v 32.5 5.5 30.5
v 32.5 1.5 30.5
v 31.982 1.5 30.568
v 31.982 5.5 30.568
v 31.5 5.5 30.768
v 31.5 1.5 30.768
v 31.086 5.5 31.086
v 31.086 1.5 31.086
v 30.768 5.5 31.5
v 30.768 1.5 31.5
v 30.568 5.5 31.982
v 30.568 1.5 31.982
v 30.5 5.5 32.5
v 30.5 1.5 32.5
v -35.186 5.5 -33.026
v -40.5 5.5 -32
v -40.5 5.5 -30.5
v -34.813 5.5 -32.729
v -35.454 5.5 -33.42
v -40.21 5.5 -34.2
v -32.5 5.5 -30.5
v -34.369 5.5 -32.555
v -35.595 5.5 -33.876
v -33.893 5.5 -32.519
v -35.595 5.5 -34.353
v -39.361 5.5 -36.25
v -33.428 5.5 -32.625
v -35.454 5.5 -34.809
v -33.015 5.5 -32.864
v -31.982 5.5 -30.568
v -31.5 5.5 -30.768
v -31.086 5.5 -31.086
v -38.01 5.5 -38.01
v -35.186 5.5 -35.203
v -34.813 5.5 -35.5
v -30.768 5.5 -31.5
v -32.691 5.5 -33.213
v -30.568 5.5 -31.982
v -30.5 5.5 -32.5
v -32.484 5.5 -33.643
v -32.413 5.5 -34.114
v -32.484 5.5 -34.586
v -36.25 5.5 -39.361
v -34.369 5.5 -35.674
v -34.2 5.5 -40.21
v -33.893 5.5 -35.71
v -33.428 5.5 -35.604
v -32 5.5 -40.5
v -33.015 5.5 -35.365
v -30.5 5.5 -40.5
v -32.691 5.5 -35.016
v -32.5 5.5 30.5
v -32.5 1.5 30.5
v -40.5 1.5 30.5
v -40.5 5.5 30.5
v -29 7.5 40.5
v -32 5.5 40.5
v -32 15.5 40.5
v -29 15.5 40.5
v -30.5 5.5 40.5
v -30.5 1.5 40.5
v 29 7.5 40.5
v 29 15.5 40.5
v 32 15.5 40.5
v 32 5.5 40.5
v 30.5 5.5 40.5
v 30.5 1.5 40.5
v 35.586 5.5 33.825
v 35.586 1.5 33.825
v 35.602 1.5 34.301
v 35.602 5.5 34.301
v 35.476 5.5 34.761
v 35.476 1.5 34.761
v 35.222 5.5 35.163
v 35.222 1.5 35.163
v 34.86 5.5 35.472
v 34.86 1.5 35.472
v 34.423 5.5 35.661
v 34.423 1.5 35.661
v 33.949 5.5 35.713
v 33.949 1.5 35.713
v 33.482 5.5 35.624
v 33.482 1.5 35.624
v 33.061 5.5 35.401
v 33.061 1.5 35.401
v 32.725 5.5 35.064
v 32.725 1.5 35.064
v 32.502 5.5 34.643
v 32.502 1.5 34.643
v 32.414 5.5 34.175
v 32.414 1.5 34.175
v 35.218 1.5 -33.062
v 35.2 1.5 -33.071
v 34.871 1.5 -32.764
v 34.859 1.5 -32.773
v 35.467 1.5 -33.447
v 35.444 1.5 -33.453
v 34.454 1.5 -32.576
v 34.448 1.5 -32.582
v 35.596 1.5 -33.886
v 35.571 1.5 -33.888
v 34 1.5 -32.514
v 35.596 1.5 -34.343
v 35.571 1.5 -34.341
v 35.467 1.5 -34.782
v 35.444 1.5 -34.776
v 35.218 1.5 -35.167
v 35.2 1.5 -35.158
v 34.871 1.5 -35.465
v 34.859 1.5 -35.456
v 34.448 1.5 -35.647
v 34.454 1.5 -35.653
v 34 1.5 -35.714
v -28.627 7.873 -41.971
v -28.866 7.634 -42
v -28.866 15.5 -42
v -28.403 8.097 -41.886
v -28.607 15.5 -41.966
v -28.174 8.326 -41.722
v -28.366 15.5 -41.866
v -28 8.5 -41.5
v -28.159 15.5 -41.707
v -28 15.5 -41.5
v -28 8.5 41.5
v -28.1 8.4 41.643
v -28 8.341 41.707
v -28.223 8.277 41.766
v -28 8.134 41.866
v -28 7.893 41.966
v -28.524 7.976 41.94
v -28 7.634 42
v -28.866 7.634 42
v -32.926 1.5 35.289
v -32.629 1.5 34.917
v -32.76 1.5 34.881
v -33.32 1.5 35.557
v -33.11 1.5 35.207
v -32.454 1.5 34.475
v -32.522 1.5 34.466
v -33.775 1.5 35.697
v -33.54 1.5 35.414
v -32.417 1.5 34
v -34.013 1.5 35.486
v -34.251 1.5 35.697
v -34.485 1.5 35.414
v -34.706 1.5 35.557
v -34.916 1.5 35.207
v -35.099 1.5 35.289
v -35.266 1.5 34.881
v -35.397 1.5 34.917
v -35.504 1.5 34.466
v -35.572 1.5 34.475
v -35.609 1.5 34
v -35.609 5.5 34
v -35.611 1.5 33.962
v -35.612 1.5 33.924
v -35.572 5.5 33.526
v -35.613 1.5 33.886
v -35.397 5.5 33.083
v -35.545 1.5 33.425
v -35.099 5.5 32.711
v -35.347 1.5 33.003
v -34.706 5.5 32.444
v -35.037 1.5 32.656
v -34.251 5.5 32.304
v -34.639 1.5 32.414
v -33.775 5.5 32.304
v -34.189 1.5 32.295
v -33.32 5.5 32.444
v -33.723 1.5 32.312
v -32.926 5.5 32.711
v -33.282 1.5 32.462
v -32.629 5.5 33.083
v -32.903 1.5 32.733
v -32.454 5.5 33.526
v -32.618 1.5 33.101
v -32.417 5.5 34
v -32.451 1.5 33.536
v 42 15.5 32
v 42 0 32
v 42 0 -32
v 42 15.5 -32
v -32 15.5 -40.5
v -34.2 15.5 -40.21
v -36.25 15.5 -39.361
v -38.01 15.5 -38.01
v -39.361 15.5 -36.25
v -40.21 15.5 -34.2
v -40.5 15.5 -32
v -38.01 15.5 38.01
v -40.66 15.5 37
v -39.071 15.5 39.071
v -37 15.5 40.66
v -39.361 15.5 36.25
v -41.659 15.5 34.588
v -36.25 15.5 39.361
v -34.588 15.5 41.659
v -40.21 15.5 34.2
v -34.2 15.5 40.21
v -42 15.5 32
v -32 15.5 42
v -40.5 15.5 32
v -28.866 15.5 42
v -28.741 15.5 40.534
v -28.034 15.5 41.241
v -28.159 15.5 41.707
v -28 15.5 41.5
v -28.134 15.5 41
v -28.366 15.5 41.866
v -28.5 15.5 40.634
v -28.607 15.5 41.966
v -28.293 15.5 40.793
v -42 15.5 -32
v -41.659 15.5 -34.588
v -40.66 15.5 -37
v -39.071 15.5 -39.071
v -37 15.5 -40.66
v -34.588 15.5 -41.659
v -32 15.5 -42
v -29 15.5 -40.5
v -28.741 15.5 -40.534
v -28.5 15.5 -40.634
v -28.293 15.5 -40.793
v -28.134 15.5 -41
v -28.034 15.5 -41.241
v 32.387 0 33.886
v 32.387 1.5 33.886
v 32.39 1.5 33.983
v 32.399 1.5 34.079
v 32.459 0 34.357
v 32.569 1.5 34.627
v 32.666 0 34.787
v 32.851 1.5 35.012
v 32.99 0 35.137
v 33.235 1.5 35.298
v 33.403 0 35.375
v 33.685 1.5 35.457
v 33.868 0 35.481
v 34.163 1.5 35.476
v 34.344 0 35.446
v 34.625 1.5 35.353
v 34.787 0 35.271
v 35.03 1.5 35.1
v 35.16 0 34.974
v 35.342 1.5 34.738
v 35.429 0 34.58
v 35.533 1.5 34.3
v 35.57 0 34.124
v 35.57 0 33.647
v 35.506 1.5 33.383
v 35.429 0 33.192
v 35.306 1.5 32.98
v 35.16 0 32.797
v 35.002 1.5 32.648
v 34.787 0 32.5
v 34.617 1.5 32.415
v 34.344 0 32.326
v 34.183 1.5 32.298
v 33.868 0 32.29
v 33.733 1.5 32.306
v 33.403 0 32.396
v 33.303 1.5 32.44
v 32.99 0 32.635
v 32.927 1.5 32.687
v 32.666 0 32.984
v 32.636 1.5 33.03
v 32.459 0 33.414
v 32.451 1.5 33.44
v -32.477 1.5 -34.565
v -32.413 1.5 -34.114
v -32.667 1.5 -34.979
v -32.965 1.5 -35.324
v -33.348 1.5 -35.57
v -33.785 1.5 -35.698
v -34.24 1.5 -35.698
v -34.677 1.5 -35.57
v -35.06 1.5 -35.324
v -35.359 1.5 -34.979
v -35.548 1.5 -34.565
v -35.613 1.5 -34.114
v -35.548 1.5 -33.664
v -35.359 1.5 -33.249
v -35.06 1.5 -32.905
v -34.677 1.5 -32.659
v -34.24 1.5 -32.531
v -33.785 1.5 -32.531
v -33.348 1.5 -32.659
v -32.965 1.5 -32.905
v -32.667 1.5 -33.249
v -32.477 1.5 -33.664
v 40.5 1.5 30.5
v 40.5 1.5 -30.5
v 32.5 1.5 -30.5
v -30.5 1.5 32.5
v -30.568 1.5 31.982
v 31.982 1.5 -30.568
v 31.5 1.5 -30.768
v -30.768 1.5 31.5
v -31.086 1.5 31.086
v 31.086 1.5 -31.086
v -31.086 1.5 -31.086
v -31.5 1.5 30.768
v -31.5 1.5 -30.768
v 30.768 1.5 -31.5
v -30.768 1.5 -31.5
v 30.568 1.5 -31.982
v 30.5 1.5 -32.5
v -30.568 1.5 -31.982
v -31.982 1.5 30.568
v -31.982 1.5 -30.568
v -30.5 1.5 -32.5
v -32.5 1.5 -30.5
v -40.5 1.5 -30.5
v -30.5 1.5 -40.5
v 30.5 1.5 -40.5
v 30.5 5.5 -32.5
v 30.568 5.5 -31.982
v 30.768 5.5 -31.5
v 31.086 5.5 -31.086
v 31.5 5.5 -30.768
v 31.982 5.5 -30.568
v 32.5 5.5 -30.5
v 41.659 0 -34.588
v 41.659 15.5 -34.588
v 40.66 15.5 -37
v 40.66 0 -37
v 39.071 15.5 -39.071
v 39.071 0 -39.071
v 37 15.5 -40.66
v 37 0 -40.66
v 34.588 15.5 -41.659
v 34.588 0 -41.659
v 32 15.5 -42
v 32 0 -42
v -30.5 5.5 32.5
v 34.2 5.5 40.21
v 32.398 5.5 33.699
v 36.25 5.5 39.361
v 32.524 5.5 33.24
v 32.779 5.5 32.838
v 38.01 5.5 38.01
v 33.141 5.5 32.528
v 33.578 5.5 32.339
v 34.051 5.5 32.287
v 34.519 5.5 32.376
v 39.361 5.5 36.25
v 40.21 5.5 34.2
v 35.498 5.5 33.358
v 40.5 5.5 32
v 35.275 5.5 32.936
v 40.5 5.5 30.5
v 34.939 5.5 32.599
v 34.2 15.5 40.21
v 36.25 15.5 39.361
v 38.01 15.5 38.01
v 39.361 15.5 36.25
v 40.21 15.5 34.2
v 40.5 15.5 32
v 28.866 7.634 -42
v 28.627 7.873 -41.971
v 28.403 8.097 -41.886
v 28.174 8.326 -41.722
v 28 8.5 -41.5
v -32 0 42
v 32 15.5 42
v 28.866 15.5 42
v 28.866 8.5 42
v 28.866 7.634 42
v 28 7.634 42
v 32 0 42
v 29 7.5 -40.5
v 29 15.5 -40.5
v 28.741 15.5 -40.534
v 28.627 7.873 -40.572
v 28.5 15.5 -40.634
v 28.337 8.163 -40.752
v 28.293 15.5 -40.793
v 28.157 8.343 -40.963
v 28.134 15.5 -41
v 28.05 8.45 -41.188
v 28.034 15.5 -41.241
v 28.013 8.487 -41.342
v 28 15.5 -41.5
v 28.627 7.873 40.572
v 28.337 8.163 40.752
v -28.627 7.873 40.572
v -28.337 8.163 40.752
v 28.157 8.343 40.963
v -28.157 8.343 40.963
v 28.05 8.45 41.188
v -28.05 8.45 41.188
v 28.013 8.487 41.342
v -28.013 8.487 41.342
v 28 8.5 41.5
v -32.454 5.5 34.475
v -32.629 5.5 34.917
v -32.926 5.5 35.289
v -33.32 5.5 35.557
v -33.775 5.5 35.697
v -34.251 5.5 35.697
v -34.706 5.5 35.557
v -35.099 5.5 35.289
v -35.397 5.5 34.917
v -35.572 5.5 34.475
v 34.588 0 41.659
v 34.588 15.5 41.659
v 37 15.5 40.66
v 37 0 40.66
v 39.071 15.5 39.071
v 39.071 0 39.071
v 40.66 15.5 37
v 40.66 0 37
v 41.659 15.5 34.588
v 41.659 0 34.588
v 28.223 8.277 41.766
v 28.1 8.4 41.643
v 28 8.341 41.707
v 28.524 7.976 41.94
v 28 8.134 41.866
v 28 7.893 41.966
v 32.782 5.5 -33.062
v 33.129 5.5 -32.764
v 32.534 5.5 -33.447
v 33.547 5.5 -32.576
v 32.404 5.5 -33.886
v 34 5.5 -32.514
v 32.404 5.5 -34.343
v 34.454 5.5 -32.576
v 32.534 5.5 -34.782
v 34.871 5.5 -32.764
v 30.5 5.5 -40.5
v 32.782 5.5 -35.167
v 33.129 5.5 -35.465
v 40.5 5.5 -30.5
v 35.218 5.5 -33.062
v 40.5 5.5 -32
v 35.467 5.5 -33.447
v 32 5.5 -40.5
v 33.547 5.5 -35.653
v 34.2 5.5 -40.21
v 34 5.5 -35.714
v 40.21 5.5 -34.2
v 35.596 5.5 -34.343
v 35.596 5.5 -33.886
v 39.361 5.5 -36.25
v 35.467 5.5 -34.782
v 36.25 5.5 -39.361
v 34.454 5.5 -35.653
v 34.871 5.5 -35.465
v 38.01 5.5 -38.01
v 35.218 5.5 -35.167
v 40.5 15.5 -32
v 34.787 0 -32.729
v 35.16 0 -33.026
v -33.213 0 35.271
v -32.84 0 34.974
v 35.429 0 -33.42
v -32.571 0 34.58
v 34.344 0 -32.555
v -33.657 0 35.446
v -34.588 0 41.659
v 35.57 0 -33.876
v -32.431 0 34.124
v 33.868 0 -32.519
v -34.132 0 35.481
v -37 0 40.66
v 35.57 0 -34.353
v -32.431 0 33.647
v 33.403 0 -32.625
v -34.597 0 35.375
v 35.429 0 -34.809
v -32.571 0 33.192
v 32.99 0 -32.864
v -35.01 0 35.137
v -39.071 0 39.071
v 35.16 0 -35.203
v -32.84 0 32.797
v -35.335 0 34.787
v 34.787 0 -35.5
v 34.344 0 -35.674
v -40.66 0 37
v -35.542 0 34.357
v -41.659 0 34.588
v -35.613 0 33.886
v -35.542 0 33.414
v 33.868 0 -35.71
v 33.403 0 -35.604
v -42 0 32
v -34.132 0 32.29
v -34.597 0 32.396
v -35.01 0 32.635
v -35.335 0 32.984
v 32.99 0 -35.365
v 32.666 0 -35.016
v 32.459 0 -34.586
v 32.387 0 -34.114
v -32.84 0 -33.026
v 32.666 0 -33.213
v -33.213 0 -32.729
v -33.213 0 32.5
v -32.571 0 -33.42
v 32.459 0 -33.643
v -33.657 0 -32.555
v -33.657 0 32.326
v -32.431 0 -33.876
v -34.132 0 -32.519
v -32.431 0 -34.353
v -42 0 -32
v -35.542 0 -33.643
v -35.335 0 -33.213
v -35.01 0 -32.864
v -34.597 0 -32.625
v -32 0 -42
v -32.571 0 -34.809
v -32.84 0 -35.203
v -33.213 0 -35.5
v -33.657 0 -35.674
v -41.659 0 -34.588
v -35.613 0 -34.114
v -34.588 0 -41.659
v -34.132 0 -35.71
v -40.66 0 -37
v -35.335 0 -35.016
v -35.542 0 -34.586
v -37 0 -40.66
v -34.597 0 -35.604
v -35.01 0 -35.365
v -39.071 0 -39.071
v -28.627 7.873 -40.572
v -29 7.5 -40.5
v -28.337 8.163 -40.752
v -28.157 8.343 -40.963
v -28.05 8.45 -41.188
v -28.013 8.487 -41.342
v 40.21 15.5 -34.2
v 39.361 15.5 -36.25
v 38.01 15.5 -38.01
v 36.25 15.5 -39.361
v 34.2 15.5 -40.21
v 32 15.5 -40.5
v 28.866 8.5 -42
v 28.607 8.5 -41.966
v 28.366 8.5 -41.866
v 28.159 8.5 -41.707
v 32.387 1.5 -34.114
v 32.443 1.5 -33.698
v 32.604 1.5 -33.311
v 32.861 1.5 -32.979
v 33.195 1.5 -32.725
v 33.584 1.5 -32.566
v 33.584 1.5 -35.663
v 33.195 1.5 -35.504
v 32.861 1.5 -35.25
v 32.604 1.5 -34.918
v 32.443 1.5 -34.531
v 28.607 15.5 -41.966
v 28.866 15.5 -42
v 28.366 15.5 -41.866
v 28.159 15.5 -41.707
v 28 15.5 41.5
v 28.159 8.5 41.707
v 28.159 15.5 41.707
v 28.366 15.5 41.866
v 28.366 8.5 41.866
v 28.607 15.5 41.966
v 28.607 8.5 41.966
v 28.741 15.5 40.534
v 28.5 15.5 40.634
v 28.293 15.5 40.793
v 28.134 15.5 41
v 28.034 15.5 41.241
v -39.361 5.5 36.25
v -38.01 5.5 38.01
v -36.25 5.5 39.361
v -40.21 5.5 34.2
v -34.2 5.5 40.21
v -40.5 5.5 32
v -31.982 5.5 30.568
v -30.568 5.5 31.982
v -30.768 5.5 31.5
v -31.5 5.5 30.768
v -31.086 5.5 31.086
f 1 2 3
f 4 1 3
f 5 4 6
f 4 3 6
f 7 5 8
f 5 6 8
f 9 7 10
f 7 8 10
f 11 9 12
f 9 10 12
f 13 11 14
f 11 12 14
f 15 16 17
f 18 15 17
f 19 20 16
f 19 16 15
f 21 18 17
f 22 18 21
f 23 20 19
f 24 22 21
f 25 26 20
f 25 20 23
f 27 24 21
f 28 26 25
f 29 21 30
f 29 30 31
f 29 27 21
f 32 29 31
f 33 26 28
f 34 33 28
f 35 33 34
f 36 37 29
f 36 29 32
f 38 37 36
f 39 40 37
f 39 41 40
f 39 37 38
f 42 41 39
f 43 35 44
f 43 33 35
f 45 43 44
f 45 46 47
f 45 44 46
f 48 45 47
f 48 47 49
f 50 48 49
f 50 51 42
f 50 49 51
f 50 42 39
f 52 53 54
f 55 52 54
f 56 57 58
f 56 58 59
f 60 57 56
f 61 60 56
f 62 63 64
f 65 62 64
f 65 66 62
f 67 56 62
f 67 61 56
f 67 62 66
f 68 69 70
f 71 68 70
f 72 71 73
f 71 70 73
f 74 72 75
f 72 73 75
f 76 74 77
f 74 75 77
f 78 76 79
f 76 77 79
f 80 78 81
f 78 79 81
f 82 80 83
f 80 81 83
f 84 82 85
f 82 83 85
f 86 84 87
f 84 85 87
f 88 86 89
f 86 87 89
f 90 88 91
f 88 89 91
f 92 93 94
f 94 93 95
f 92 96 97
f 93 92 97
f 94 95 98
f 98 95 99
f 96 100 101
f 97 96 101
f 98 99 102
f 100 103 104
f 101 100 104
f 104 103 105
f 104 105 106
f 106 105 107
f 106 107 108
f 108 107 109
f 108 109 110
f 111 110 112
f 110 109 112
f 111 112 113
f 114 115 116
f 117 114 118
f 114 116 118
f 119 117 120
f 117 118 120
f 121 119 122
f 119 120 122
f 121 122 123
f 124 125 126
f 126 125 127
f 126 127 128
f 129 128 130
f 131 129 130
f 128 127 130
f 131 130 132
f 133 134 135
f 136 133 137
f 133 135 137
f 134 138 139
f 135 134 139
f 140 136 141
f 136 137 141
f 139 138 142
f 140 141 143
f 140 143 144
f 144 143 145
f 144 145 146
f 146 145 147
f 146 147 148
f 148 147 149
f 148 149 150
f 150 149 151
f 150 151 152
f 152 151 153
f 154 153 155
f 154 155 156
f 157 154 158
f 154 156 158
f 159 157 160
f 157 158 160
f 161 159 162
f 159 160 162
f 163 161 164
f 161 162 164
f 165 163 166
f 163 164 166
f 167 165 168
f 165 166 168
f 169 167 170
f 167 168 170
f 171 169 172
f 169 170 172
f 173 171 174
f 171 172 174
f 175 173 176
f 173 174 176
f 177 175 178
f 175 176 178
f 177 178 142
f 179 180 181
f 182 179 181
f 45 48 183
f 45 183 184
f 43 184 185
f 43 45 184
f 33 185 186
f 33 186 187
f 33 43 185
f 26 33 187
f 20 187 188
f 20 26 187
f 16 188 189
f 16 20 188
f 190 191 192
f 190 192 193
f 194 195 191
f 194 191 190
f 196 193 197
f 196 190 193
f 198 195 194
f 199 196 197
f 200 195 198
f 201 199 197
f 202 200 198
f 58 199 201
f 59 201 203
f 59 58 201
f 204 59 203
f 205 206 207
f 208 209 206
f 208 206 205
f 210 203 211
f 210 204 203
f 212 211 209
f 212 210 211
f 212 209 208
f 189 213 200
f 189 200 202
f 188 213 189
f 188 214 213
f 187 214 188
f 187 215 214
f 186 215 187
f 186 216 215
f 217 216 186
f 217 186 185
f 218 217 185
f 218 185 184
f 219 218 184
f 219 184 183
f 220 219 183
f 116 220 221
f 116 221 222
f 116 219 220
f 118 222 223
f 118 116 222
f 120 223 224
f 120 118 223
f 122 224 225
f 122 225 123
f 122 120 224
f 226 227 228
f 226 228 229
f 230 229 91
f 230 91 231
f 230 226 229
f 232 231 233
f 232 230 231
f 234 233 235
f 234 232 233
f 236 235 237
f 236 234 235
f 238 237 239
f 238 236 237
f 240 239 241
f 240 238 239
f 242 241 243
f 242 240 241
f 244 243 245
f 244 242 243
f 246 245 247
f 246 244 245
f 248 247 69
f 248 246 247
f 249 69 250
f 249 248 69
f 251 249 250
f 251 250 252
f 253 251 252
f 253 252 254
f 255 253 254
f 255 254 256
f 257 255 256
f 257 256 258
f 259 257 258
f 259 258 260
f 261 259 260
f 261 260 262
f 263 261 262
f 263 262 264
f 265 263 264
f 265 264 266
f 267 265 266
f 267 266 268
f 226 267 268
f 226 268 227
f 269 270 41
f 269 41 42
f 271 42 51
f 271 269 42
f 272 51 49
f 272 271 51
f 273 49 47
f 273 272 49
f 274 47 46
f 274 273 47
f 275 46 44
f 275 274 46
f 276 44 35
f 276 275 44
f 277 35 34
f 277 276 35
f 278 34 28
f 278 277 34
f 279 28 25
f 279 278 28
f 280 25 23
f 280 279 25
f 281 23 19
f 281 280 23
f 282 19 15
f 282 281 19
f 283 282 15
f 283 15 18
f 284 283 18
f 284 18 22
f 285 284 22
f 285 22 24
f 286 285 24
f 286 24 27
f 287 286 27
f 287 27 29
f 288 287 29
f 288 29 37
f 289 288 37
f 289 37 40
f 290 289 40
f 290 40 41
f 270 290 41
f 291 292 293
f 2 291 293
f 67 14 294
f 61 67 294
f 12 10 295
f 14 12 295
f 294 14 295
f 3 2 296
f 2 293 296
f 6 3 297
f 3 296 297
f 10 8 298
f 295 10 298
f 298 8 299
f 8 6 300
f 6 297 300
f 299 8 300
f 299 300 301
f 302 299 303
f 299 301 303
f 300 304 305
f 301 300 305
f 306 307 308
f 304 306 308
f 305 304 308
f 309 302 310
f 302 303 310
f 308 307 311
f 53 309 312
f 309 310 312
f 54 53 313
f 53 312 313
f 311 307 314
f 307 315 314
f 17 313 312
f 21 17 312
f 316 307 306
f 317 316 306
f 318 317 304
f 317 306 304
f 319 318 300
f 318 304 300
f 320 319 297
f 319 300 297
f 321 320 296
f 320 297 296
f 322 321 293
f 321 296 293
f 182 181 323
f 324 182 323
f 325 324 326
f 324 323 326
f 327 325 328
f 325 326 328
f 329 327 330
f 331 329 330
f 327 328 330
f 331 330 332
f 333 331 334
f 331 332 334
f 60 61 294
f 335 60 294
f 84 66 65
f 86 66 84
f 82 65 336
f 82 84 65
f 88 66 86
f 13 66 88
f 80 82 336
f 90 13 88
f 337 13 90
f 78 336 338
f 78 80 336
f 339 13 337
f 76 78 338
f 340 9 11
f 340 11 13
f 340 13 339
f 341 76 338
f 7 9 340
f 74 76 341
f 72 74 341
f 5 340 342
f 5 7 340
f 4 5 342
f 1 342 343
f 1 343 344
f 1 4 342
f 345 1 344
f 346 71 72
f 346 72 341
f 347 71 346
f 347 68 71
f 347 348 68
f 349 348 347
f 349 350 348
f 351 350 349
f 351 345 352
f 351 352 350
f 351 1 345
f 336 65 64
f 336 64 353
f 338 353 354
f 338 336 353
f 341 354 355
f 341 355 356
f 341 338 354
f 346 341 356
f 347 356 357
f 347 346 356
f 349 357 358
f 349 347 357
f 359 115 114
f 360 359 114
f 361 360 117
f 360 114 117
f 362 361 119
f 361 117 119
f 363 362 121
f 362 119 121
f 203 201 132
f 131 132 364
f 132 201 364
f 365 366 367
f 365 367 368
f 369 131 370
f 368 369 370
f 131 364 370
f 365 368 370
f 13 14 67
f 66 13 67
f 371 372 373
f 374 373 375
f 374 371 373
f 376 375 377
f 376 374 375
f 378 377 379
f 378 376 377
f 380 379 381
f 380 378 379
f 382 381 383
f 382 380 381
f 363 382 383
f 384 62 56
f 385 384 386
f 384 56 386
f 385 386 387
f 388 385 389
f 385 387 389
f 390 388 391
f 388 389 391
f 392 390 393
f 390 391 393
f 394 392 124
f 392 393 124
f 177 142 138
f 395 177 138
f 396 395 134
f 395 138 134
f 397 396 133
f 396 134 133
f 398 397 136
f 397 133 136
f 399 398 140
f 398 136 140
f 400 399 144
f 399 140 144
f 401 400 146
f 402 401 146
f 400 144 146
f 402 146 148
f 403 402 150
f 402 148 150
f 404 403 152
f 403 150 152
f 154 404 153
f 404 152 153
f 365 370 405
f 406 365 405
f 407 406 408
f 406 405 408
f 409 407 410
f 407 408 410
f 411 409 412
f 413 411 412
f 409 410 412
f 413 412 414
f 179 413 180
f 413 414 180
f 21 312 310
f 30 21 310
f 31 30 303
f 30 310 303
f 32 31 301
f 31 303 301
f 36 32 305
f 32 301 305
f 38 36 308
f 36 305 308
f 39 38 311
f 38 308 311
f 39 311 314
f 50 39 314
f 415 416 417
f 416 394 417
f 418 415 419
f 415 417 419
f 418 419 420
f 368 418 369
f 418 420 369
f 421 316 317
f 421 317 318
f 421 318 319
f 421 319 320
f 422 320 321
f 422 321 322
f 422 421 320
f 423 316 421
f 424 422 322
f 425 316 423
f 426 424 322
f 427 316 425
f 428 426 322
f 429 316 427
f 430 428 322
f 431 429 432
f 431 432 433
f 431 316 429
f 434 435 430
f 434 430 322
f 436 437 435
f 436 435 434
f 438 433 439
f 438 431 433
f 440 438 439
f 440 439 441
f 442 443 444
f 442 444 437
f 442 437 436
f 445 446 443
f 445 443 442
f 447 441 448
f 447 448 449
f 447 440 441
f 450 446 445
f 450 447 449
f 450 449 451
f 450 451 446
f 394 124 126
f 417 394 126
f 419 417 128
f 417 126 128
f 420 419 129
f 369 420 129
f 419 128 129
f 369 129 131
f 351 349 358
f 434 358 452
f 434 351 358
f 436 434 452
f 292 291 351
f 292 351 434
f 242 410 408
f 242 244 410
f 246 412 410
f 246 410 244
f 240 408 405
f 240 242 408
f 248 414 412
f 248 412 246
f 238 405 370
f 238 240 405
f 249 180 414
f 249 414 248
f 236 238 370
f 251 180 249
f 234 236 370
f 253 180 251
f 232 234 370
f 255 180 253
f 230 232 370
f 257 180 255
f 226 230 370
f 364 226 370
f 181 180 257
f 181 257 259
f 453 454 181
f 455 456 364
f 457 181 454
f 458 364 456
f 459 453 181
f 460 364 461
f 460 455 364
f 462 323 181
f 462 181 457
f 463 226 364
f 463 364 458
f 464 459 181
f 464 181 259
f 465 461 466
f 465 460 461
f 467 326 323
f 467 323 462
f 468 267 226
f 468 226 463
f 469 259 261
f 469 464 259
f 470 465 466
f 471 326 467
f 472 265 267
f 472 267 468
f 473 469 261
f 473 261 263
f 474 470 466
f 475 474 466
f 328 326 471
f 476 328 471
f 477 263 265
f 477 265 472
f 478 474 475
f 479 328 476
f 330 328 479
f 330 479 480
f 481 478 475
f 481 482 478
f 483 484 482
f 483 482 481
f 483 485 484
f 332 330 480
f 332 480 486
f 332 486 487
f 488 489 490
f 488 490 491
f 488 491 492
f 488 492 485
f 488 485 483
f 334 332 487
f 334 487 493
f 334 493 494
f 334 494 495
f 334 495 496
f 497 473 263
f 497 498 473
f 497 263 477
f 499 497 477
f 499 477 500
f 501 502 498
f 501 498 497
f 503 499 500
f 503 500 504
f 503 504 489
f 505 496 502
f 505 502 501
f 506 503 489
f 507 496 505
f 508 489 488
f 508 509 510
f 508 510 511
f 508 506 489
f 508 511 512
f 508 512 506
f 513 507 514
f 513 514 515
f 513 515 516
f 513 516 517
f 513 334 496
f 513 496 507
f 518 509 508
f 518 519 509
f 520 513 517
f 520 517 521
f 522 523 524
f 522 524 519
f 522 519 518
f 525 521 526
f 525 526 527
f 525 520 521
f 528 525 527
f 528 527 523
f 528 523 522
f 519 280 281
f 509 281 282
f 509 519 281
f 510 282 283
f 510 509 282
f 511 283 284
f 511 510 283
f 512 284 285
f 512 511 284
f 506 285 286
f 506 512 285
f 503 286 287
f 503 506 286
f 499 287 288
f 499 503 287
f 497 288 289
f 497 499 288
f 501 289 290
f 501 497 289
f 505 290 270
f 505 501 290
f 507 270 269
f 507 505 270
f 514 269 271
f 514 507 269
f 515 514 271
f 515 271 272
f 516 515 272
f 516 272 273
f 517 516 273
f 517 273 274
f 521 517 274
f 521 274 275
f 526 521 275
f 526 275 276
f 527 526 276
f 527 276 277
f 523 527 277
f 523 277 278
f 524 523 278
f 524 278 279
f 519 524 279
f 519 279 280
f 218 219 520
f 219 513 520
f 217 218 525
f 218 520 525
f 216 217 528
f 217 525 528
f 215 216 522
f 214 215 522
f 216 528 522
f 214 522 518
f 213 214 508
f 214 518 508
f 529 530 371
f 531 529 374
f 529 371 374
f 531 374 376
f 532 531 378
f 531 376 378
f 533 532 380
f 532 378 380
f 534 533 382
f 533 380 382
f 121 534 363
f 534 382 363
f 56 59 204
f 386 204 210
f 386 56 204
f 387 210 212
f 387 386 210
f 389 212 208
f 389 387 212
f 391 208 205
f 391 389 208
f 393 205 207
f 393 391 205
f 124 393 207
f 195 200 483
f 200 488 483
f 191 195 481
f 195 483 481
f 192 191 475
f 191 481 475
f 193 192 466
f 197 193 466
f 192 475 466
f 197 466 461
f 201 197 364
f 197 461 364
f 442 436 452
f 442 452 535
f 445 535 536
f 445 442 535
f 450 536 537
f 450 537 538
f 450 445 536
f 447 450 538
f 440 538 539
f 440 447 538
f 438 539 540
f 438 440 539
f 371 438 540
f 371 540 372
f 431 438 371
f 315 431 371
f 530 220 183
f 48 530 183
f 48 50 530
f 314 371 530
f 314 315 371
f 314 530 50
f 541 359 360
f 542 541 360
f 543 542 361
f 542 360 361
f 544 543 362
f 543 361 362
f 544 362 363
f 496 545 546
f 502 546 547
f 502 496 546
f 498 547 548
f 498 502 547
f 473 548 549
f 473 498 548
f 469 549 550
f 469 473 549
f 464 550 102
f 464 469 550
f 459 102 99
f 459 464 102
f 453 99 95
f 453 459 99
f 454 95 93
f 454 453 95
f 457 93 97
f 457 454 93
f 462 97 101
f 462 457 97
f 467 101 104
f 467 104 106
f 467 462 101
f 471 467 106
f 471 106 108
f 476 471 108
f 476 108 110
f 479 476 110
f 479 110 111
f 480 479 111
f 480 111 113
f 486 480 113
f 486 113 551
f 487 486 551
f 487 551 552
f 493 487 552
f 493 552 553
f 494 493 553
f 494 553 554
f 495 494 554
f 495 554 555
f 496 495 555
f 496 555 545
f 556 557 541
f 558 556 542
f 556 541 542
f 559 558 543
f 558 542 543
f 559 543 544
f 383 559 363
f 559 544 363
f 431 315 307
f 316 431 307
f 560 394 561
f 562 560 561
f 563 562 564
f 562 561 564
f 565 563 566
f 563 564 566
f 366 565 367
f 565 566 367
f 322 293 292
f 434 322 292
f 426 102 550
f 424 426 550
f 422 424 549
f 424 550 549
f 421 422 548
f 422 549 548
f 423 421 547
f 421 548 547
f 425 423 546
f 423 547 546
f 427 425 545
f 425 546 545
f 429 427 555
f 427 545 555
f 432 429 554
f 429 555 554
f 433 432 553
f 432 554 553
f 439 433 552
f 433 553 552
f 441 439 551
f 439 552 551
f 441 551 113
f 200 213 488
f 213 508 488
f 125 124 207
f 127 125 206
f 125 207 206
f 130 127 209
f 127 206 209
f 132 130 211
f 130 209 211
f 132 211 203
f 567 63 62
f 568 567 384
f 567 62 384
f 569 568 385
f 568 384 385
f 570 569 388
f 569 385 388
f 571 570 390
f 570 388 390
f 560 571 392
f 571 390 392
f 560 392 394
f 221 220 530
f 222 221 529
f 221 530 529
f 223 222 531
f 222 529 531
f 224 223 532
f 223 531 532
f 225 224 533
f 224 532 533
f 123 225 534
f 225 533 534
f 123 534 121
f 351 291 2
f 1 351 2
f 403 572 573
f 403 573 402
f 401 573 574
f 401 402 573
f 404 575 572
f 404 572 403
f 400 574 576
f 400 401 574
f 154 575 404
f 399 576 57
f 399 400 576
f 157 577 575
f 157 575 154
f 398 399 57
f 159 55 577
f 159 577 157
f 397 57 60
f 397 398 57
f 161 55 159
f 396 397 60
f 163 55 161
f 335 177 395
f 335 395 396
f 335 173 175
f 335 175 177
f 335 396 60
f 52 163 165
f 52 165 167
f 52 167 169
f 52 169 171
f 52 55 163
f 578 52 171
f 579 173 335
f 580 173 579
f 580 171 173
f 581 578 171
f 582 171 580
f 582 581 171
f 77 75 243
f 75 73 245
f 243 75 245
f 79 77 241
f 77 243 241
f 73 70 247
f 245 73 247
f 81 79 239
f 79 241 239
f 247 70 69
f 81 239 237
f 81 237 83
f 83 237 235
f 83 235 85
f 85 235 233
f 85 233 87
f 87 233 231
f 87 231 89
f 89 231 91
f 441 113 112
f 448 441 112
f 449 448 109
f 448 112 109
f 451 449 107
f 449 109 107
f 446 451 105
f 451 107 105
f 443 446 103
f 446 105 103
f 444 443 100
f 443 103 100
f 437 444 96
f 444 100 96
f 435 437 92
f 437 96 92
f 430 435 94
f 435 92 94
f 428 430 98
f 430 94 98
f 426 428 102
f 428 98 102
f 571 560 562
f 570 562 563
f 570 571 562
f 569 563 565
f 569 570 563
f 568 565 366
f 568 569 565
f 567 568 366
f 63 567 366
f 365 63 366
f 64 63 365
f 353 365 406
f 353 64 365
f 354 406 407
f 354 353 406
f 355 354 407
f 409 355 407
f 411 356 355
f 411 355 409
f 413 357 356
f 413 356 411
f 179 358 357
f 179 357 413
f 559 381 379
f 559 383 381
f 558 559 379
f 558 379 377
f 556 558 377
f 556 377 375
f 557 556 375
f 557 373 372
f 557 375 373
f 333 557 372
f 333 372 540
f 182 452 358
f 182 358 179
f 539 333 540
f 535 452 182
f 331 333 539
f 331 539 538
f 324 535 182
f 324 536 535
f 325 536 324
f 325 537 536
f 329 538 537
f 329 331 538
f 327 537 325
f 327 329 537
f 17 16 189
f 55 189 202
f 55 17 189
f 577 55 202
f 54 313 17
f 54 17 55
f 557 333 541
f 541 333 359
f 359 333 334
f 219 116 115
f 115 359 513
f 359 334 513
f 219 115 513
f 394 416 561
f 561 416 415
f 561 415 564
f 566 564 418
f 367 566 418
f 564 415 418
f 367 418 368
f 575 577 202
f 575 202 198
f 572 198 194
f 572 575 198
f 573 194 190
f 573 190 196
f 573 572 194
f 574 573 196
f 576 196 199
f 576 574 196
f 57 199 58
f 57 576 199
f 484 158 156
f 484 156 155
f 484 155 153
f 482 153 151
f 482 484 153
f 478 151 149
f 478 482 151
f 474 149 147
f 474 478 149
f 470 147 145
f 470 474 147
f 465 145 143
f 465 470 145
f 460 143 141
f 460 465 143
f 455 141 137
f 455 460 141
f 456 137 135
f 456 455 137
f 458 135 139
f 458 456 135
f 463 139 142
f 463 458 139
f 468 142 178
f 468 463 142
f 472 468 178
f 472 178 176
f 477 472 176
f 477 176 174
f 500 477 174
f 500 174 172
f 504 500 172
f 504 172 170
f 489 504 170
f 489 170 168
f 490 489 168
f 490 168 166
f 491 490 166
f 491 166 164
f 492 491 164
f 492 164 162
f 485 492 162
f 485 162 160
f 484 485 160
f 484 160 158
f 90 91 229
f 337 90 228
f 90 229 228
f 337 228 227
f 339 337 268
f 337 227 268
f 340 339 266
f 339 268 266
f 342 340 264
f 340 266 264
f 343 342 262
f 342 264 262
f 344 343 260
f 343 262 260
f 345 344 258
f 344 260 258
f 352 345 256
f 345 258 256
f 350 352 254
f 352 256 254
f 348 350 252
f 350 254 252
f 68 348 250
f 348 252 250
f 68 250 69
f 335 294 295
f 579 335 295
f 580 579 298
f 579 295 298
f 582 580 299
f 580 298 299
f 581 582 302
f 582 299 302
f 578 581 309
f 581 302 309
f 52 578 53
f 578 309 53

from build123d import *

# Parameters (mm, degrees)
EXTRUDE_1_DEPTH     = 1.5
EXTRUDE_2_DEPTH     = 14
EXTRUDE_3_OUTLINE_R = 1.60000381
EXTRUDE_3_DEPTH     = 4
SKETCH_4_W          = 56
SKETCH_4_H          = 7
CUT_EXTRUDE_1_DEPTH = 2
SKETCH_5_W          = 56
SKETCH_5_H          = 7
CUT_EXTRUDE_2_DEPTH = 2
FILLET_1_R          = 1
FILLET_2_R          = 1


with BuildPart() as part:
    # 草图1 → 凸台-拉伸1 (new body)
    with BuildSketch(Plane(origin=(0, 0, 0), x_dir=(1, 0, 0), z_dir=(0, 1, 0))):
        with BuildLine():
            Line((-32, 42), (32, 42))
            ThreePointArc((32, 42), (39.071067812, 39.071067812), (42, 32))
            Line((42, 32), (42, -32))
            ThreePointArc((42, -32), (39.071067812, -39.071067812), (32, -42))
            Line((32, -42), (-32, -42))
            ThreePointArc((-32, -42), (-39.071067812, -39.071067812), (-42, -32))
            Line((-42, -32), (-42, 32))
            ThreePointArc((-42, 32), (-39.071067812, 39.071067812), (-32, 42))
        make_face()
        with BuildLine():
            ThreePointArc((-32.412680975, -33.885727711), (-34.012684785, -32.285723901), (-35.612688595, -33.885727711))
            ThreePointArc((-35.612688595, -33.885727711), (-34.012684785, -35.485731521), (-32.412680975, -33.885727711))
        make_face(mode=Mode.SUBTRACT)
        with BuildLine():
            ThreePointArc((35.587491745, -33.885727711), (33.987487935, -32.285723901), (32.387484125, -33.885727711))
            ThreePointArc((32.387484125, -33.885727711), (33.987487935, -35.485731521), (35.587491745, -33.885727711))
        make_face(mode=Mode.SUBTRACT)
        with BuildLine():
            ThreePointArc((35.587491745, 34.114445009), (33.987487935, 35.714448819), (32.387484125, 34.114445009))
            ThreePointArc((32.387484125, 34.114445009), (33.987487935, 32.514441199), (35.587491745, 34.114445009))
        make_face(mode=Mode.SUBTRACT)
        with BuildLine():
            ThreePointArc((-32.412680975, 34.114445009), (-34.012684785, 35.714448819), (-35.612688595, 34.114445009))
            ThreePointArc((-35.612688595, 34.114445009), (-34.012684785, 32.514441199), (-32.412680975, 34.114445009))
        make_face(mode=Mode.SUBTRACT)
    extrude(amount=EXTRUDE_1_DEPTH)

    # 草图2 → 凸台-拉伸2 (add)
    with BuildSketch(Plane(origin=(0, 1.5, 0), x_dir=(1, 0, 0), z_dir=(0, 1, 0))):
        with BuildLine():
            Line((32, 42), (-32, 42))
            ThreePointArc((-32, 42), (-39.071067812, 39.071067812), (-42, 32))
            Line((-42, 32), (-42, -32))
            ThreePointArc((-42, -32), (-39.071067812, -39.071067812), (-32, -42))
            Line((-32, -42), (32, -42))
            ThreePointArc((32, -42), (39.071067812, -39.071067812), (42, -32))
            Line((42, -32), (42, 32))
            ThreePointArc((42, 32), (39.071067812, 39.071067812), (32, 42))
        make_face()
        with BuildLine():
            Line((-40.5, 32), (-40.5, -32))
            ThreePointArc((-40.5, -32), (-38.01040764, -38.01040764), (-32, -40.5))
            Line((-32, -40.5), (32, -40.5))
            ThreePointArc((32, -40.5), (38.01040764, -38.01040764), (40.5, -32))
            Line((40.5, -32), (40.5, 32))
            ThreePointArc((40.5, 32), (38.01040764, 38.01040764), (32, 40.5))
            Line((32, 40.5), (-32, 40.5))
            ThreePointArc((-32, 40.5), (-38.01040764, 38.01040764), (-40.5, 32))
        make_face(mode=Mode.SUBTRACT)
    extrude(amount=EXTRUDE_2_DEPTH)

    # 凸台-拉伸3: read off the stored shape, not the designer's step
    # 凸台-拉伸3 outline → 凸台-拉伸3 (add)
    # profile 1 of 4: a face of its own
    with BuildSketch(Plane(origin=(0, 1.5, 0), x_dir=(1, 0, 0), z_dir=(0, 1, 0))):
        with BuildLine():
            ThreePointArc((-32.5, 30.5), (-31.085786438, 31.085786438), (-30.5, 32.5))
            Line((-30.5, 32.5), (-30.5, 40.5))
            Line((-30.5, 40.5), (-32, 40.5))
            ThreePointArc((-32, 40.5), (-38.01040764, 38.01040764), (-40.5, 32))
            Line((-40.5, 32), (-40.5, 30.5))
            Line((-40.5, 30.5), (-32.5, 30.5))
        make_face()
        with Locations((-34.012684785, 34.114445009)):
            Circle(EXTRUDE_3_OUTLINE_R, mode=Mode.SUBTRACT)
    # profile 2 of 4: a face of its own
    with BuildSketch(Plane(origin=(0, 1.5, 0), x_dir=(1, 0, 0), z_dir=(0, 1, 0))):
        with BuildLine():
            Line((32, 40.5), (30.5, 40.5))
            Line((30.5, 40.5), (30.5, 32.5))
            ThreePointArc((30.5, 32.5), (31.085786438, 31.085786438), (32.5, 30.5))
            Line((32.5, 30.5), (40.5, 30.5))
            Line((40.5, 30.5), (40.5, 32))
            ThreePointArc((40.5, 32), (38.01040764, 38.01040764), (32, 40.5))
        make_face()
        with BuildLine():
            ThreePointArc((34.00008636, 32.5144908), (32.387484125, 34.114445009), (34.00008636, 35.714399218))
            ThreePointArc((34.00008636, 35.714399218), (35.612688595, 34.114445009), (34.00008636, 32.5144908))
        make_face(mode=Mode.SUBTRACT)
    # profile 3 of 4: a face of its own
    with BuildSketch(Plane(origin=(0, 1.5, 0), x_dir=(1, 0, 0), z_dir=(0, 1, 0))):
        with BuildLine():
            Line((-32.5, -30.5), (-40.5, -30.5))
            Line((-40.5, -30.5), (-40.5, -32))
            ThreePointArc((-40.5, -32), (-38.01040764, -38.01040764), (-32, -40.5))
            Line((-32, -40.5), (-30.5, -40.5))
            Line((-30.5, -40.5), (-30.5, -32.5))
            ThreePointArc((-30.5, -32.5), (-31.085786438, -31.085786438), (-32.5, -30.5))
        make_face()
        with BuildLine():
            ThreePointArc((-35.608596528, -34.00008636), (-34.012684785, -32.285723901), (-32.416773042, -34.00008636))
            ThreePointArc((-32.416773042, -34.00008636), (-34.012684785, -35.714448819), (-35.608596528, -34.00008636))
        make_face(mode=Mode.SUBTRACT)
    # profile 4 of 4: a face of its own
    with BuildSketch(Plane(origin=(0, 1.5, 0), x_dir=(1, 0, 0), z_dir=(0, 1, 0))):
        with BuildLine():
            Line((40.5, -32), (40.5, -30.5))
            Line((40.5, -30.5), (32.5, -30.5))
            ThreePointArc((32.5, -30.5), (31.085786438, -31.085786438), (30.5, -32.5))
            Line((30.5, -32.5), (30.5, -40.5))
            Line((30.5, -40.5), (32, -40.5))
            ThreePointArc((32, -40.5), (38.01040764, -38.01040764), (40.5, -32))
        make_face()
        with BuildLine():
            ThreePointArc((32.413821191, -34.174838714), (33.81228204, -32.295345654), (35.586351529, -33.825334006))
            ThreePointArc((35.586351529, -33.825334006), (34.18789068, -35.704827066), (32.413821191, -34.174838714))
        make_face(mode=Mode.SUBTRACT)
    extrude(amount=EXTRUDE_3_DEPTH)

    # 草图4 → 切除-拉伸1 (cut)
    with BuildSketch(Plane.XY.offset(42)):
        with Locations((0, 12)):
            Rectangle(SKETCH_4_W, SKETCH_4_H)
    extrude(amount=-CUT_EXTRUDE_1_DEPTH, mode=Mode.SUBTRACT)

    # 草图5 → 切除-拉伸2 (cut)
    with BuildSketch(Plane(origin=(0, 0, -42), x_dir=(-1, 0, 0), z_dir=(0, 0, -1))):
        with Locations((0, 12)):
            Rectangle(SKETCH_5_W, SKETCH_5_H)
    extrude(amount=-CUT_EXTRUDE_2_DEPTH, mode=Mode.SUBTRACT)

    # 圆角1
    fillet_1_edges = [part.edges().sort_by_distance(p)[0] for p in [
        (0, 8.5, 40.5),
        (28, 12, 40.5),
        (-28, 12, 40.5),
        (0, 8.5, -40.5),
        (-28, 12, -40.5),
        (28, 12, -40.5),
    ]]
    fillet(fillet_1_edges, radius=FILLET_1_R)

    # 圆角2
    # the kernel refuses this fillet: 1 mm, written as the material it takes off along each edge
    with BuildSketch(Plane(origin=(-28, 17.665063509, 42), x_dir=(-1, 0, 0), z_dir=(0, -1, 0))) as fillet_2_piece_1:
        with BuildLine():
            CenterArc((0.866025404, 1), FILLET_2_R, 210, 60)
            Line((0, 0.5), (-0.017320508, 0.49))
            ThreePointArc((-0.017320508, 0.49), (-0.02, 0.25), (-0.02, 0))
            Line((-0.02, 0), (0, -0.02))
            Line((0, -0.02), (0.866025404, -0.02))
            Line((0.866025404, -0.02), (0.866025404, 0))
        make_face()
    extrude(amount=9.165063509, mode=Mode.SUBTRACT)
    with BuildSketch(Plane(origin=(-28, 8.5, 42), x_dir=(0, -1, 0), z_dir=(1, 0, 0))) as fillet_2_piece_2:
        with BuildLine():
            CenterArc((0.866025404, 1), FILLET_2_R, 210, 60)
            Line((0, 0.5), (-0.017320508, 0.49))
            ThreePointArc((-0.017320508, 0.49), (-0.02, 0.25), (-0.02, 0))
            Line((-0.02, 0), (0, -0.02))
            Line((0, -0.02), (0.866025404, -0.02))
            Line((0.866025404, -0.02), (0.866025404, 0))
        make_face()
    extrude(amount=56, mode=Mode.SUBTRACT)
    with BuildSketch(Plane(origin=(28, 8.5, 42), x_dir=(0, 0, -1), z_dir=(0, 1, 0))) as fillet_2_piece_3:
        with BuildLine():
            CenterArc((1, -0.866025404), FILLET_2_R, 120, 60)
            Line((0, -0.866025404), (-0.02, -0.866025404))
            Line((-0.02, -0.866025404), (-0.02, 0))
            Line((-0.02, 0), (0, 0.02))
            ThreePointArc((0, 0.02), (0.25, 0.02), (0.49, 0.017320508))
            Line((0.49, 0.017320508), (0.5, 0))
        make_face()
    extrude(amount=9.165063509, mode=Mode.SUBTRACT)
    with BuildSketch(Plane(origin=(-28, 17.665063509, -42), x_dir=(-1, 0, 0), z_dir=(0, -1, 0)), Plane(origin=(28, 8.5, -42), x_dir=(1, 0, 0), z_dir=(0, 1, 0))) as fillet_2_piece_4:
        with BuildLine():
            CenterArc((0.866025404, -1), FILLET_2_R, 90, 60)
            Line((0, -0.5), (-0.017320508, -0.49))
            ThreePointArc((-0.017320508, -0.49), (-0.02, -0.25), (-0.02, 0))
            Line((-0.02, 0), (0, 0.02))
            Line((0, 0.02), (0.866025404, 0.02))
            Line((0.866025404, 0.02), (0.866025404, 0))
        make_face()
    extrude(amount=9.165063509, mode=Mode.SUBTRACT)
    with BuildSketch(Plane(origin=(-28, 8.5, -42), x_dir=(0, -1, 0), z_dir=(1, 0, 0))) as fillet_2_piece_5:
        with BuildLine():
            CenterArc((0.866025404, -1), FILLET_2_R, 90, 60)
            Line((0, -0.5), (-0.017320508, -0.49))
            ThreePointArc((-0.017320508, -0.49), (-0.02, -0.25), (-0.02, 0))
            Line((-0.02, 0), (0, 0.02))
            Line((0, 0.02), (0.866025404, 0.02))
            Line((0.866025404, 0.02), (0.866025404, 0))
        make_face()
    extrude(amount=56, mode=Mode.SUBTRACT)
    with BuildSketch(Plane(origin=(-28, 17.665063509, 42), x_dir=(-1, 0, 0), z_dir=(0, -1, 0))) as fillet_2_piece_6a_section:
        with BuildLine():
            CenterArc((0.866025404, 1), FILLET_2_R, 210, 60)
            Line((0, 0.5), (-0.017320508, 0.49))
            ThreePointArc((-0.017320508, 0.49), (-0.02, 0.25), (-0.02, 0))
            Line((-0.02, 0), (0, -0.02))
            Line((0, -0.02), (0.866025404, -0.02))
            Line((0.866025404, -0.02), (0.866025404, 0))
        make_face()
    fillet_2_piece_6a = extrude(amount=11.330127019, mode=Mode.PRIVATE)
    fillet_2_piece_6a = split(fillet_2_piece_6a, bisect_by=Plane(origin=(-28, 8.5, 42), z_dir=(0, -1, 0)), keep=Keep.TOP, mode=Mode.PRIVATE)
    with BuildSketch(Plane(origin=(-30.165063509, 8.5, 42), x_dir=(0, -1, 0), z_dir=(1, 0, 0))) as fillet_2_piece_6b_section:
        with BuildLine():
            CenterArc((0.866025404, 1), FILLET_2_R, 210, 60)
            Line((0, 0.5), (-0.017320508, 0.49))
            ThreePointArc((-0.017320508, 0.49), (-0.02, 0.25), (-0.02, 0))
            Line((-0.02, 0), (0, -0.02))
            Line((0, -0.02), (0.866025404, -0.02))
            Line((0.866025404, -0.02), (0.866025404, 0))
        make_face()
    fillet_2_piece_6b = extrude(amount=58.165063509, mode=Mode.PRIVATE)
    fillet_2_piece_6b = split(fillet_2_piece_6b, bisect_by=Plane(origin=(-28, 8.5, 42), z_dir=(-1, 0, 0)), keep=Keep.TOP, mode=Mode.PRIVATE)
    fillet_2_piece_6 = fillet_2_piece_6a & fillet_2_piece_6b
    add(fillet_2_piece_6, mode=Mode.SUBTRACT)
    with BuildSketch(Plane(origin=(28, 6.334936491, 42), x_dir=(0, 0, -1), z_dir=(0, 1, 0))) as fillet_2_piece_7a_section:
        with BuildLine():
            CenterArc((1, -0.866025404), FILLET_2_R, 120, 60)
            Line((0, -0.866025404), (-0.02, -0.866025404))
            Line((-0.02, -0.866025404), (-0.02, 0))
            Line((-0.02, 0), (0, 0.02))
            ThreePointArc((0, 0.02), (0.25, 0.02), (0.49, 0.017320508))
            Line((0.49, 0.017320508), (0.5, 0))
        make_face()
    fillet_2_piece_7a = extrude(amount=11.330127019, mode=Mode.PRIVATE)
    fillet_2_piece_7a = split(fillet_2_piece_7a, bisect_by=Plane(origin=(28, 8.5, 42), z_dir=(0, -1, 0)), keep=Keep.TOP, mode=Mode.PRIVATE)
    with BuildSketch(Plane(origin=(-28, 8.5, 42), x_dir=(0, -1, 0), z_dir=(1, 0, 0))) as fillet_2_piece_7b_section:
        with BuildLine():
            CenterArc((0.866025404, 1), FILLET_2_R, 210, 60)
            Line((0, 0.5), (-0.017320508, 0.49))
            ThreePointArc((-0.017320508, 0.49), (-0.02, 0.25), (-0.02, 0))
            Line((-0.02, 0), (0, -0.02))
            Line((0, -0.02), (0.866025404, -0.02))
            Line((0.866025404, -0.02), (0.866025404, 0))
        make_face()
    fillet_2_piece_7b = extrude(amount=58.165063509, mode=Mode.PRIVATE)
    fillet_2_piece_7b = split(fillet_2_piece_7b, bisect_by=Plane(origin=(28, 8.5, 42), z_dir=(1, 0, 0)), keep=Keep.TOP, mode=Mode.PRIVATE)
    fillet_2_piece_7 = fillet_2_piece_7a & fillet_2_piece_7b
    add(fillet_2_piece_7, mode=Mode.SUBTRACT)
    with BuildSketch(Plane(origin=(-30.165063509, 8.5, -42), x_dir=(0, -1, 0), z_dir=(1, 0, 0))) as fillet_2_piece_8a_section:
        with BuildLine():
            CenterArc((0.866025404, -1), FILLET_2_R, 90, 60)
            Line((0, -0.5), (-0.017320508, -0.49))
            ThreePointArc((-0.017320508, -0.49), (-0.02, -0.25), (-0.02, 0))
            Line((-0.02, 0), (0, 0.02))
            Line((0, 0.02), (0.866025404, 0.02))
            Line((0.866025404, 0.02), (0.866025404, 0))
        make_face()
    fillet_2_piece_8a = extrude(amount=58.165063509, mode=Mode.PRIVATE)
    fillet_2_piece_8a = split(fillet_2_piece_8a, bisect_by=Plane(origin=(-28, 8.5, -42), z_dir=(-1, 0, 0)), keep=Keep.TOP, mode=Mode.PRIVATE)
    with BuildSketch(Plane(origin=(-28, 17.665063509, -42), x_dir=(-1, 0, 0), z_dir=(0, -1, 0))) as fillet_2_piece_8b_section:
        with BuildLine():
            CenterArc((0.866025404, -1), FILLET_2_R, 90, 60)
            Line((0, -0.5), (-0.017320508, -0.49))
            ThreePointArc((-0.017320508, -0.49), (-0.02, -0.25), (-0.02, 0))
            Line((-0.02, 0), (0, 0.02))
            Line((0, 0.02), (0.866025404, 0.02))
            Line((0.866025404, 0.02), (0.866025404, 0))
        make_face()
    fillet_2_piece_8b = extrude(amount=11.330127019, mode=Mode.PRIVATE)
    fillet_2_piece_8b = split(fillet_2_piece_8b, bisect_by=Plane(origin=(-28, 8.5, -42), z_dir=(0, -1, 0)), keep=Keep.TOP, mode=Mode.PRIVATE)
    fillet_2_piece_8 = fillet_2_piece_8a & fillet_2_piece_8b
    add(fillet_2_piece_8, mode=Mode.SUBTRACT)
    with BuildSketch(Plane(origin=(28, 6.334936491, -42), x_dir=(1, 0, 0), z_dir=(0, 1, 0))) as fillet_2_piece_9a_section:
        with BuildLine():
            CenterArc((0.866025404, -1), FILLET_2_R, 90, 60)
            Line((0, -0.5), (-0.017320508, -0.49))
            ThreePointArc((-0.017320508, -0.49), (-0.02, -0.25), (-0.02, 0))
            Line((-0.02, 0), (0, 0.02))
            Line((0, 0.02), (0.866025404, 0.02))
            Line((0.866025404, 0.02), (0.866025404, 0))
        make_face()
    fillet_2_piece_9a = extrude(amount=11.330127019, mode=Mode.PRIVATE)
    fillet_2_piece_9a = split(fillet_2_piece_9a, bisect_by=Plane(origin=(28, 8.5, -42), z_dir=(0, -1, 0)), keep=Keep.TOP, mode=Mode.PRIVATE)
    with BuildSketch(Plane(origin=(-28, 8.5, -42), x_dir=(0, -1, 0), z_dir=(1, 0, 0))) as fillet_2_piece_9b_section:
        with BuildLine():
            CenterArc((0.866025404, -1), FILLET_2_R, 90, 60)
            Line((0, -0.5), (-0.017320508, -0.49))
            ThreePointArc((-0.017320508, -0.49), (-0.02, -0.25), (-0.02, 0))
            Line((-0.02, 0), (0, 0.02))
            Line((0, 0.02), (0.866025404, 0.02))
            Line((0.866025404, 0.02), (0.866025404, 0))
        make_face()
    fillet_2_piece_9b = extrude(amount=58.165063509, mode=Mode.PRIVATE)
    fillet_2_piece_9b = split(fillet_2_piece_9b, bisect_by=Plane(origin=(28, 8.5, -42), z_dir=(1, 0, 0)), keep=Keep.TOP, mode=Mode.PRIVATE)
    fillet_2_piece_9 = fillet_2_piece_9a & fillet_2_piece_9b
    add(fillet_2_piece_9, mode=Mode.SUBTRACT)


solid = part.part
